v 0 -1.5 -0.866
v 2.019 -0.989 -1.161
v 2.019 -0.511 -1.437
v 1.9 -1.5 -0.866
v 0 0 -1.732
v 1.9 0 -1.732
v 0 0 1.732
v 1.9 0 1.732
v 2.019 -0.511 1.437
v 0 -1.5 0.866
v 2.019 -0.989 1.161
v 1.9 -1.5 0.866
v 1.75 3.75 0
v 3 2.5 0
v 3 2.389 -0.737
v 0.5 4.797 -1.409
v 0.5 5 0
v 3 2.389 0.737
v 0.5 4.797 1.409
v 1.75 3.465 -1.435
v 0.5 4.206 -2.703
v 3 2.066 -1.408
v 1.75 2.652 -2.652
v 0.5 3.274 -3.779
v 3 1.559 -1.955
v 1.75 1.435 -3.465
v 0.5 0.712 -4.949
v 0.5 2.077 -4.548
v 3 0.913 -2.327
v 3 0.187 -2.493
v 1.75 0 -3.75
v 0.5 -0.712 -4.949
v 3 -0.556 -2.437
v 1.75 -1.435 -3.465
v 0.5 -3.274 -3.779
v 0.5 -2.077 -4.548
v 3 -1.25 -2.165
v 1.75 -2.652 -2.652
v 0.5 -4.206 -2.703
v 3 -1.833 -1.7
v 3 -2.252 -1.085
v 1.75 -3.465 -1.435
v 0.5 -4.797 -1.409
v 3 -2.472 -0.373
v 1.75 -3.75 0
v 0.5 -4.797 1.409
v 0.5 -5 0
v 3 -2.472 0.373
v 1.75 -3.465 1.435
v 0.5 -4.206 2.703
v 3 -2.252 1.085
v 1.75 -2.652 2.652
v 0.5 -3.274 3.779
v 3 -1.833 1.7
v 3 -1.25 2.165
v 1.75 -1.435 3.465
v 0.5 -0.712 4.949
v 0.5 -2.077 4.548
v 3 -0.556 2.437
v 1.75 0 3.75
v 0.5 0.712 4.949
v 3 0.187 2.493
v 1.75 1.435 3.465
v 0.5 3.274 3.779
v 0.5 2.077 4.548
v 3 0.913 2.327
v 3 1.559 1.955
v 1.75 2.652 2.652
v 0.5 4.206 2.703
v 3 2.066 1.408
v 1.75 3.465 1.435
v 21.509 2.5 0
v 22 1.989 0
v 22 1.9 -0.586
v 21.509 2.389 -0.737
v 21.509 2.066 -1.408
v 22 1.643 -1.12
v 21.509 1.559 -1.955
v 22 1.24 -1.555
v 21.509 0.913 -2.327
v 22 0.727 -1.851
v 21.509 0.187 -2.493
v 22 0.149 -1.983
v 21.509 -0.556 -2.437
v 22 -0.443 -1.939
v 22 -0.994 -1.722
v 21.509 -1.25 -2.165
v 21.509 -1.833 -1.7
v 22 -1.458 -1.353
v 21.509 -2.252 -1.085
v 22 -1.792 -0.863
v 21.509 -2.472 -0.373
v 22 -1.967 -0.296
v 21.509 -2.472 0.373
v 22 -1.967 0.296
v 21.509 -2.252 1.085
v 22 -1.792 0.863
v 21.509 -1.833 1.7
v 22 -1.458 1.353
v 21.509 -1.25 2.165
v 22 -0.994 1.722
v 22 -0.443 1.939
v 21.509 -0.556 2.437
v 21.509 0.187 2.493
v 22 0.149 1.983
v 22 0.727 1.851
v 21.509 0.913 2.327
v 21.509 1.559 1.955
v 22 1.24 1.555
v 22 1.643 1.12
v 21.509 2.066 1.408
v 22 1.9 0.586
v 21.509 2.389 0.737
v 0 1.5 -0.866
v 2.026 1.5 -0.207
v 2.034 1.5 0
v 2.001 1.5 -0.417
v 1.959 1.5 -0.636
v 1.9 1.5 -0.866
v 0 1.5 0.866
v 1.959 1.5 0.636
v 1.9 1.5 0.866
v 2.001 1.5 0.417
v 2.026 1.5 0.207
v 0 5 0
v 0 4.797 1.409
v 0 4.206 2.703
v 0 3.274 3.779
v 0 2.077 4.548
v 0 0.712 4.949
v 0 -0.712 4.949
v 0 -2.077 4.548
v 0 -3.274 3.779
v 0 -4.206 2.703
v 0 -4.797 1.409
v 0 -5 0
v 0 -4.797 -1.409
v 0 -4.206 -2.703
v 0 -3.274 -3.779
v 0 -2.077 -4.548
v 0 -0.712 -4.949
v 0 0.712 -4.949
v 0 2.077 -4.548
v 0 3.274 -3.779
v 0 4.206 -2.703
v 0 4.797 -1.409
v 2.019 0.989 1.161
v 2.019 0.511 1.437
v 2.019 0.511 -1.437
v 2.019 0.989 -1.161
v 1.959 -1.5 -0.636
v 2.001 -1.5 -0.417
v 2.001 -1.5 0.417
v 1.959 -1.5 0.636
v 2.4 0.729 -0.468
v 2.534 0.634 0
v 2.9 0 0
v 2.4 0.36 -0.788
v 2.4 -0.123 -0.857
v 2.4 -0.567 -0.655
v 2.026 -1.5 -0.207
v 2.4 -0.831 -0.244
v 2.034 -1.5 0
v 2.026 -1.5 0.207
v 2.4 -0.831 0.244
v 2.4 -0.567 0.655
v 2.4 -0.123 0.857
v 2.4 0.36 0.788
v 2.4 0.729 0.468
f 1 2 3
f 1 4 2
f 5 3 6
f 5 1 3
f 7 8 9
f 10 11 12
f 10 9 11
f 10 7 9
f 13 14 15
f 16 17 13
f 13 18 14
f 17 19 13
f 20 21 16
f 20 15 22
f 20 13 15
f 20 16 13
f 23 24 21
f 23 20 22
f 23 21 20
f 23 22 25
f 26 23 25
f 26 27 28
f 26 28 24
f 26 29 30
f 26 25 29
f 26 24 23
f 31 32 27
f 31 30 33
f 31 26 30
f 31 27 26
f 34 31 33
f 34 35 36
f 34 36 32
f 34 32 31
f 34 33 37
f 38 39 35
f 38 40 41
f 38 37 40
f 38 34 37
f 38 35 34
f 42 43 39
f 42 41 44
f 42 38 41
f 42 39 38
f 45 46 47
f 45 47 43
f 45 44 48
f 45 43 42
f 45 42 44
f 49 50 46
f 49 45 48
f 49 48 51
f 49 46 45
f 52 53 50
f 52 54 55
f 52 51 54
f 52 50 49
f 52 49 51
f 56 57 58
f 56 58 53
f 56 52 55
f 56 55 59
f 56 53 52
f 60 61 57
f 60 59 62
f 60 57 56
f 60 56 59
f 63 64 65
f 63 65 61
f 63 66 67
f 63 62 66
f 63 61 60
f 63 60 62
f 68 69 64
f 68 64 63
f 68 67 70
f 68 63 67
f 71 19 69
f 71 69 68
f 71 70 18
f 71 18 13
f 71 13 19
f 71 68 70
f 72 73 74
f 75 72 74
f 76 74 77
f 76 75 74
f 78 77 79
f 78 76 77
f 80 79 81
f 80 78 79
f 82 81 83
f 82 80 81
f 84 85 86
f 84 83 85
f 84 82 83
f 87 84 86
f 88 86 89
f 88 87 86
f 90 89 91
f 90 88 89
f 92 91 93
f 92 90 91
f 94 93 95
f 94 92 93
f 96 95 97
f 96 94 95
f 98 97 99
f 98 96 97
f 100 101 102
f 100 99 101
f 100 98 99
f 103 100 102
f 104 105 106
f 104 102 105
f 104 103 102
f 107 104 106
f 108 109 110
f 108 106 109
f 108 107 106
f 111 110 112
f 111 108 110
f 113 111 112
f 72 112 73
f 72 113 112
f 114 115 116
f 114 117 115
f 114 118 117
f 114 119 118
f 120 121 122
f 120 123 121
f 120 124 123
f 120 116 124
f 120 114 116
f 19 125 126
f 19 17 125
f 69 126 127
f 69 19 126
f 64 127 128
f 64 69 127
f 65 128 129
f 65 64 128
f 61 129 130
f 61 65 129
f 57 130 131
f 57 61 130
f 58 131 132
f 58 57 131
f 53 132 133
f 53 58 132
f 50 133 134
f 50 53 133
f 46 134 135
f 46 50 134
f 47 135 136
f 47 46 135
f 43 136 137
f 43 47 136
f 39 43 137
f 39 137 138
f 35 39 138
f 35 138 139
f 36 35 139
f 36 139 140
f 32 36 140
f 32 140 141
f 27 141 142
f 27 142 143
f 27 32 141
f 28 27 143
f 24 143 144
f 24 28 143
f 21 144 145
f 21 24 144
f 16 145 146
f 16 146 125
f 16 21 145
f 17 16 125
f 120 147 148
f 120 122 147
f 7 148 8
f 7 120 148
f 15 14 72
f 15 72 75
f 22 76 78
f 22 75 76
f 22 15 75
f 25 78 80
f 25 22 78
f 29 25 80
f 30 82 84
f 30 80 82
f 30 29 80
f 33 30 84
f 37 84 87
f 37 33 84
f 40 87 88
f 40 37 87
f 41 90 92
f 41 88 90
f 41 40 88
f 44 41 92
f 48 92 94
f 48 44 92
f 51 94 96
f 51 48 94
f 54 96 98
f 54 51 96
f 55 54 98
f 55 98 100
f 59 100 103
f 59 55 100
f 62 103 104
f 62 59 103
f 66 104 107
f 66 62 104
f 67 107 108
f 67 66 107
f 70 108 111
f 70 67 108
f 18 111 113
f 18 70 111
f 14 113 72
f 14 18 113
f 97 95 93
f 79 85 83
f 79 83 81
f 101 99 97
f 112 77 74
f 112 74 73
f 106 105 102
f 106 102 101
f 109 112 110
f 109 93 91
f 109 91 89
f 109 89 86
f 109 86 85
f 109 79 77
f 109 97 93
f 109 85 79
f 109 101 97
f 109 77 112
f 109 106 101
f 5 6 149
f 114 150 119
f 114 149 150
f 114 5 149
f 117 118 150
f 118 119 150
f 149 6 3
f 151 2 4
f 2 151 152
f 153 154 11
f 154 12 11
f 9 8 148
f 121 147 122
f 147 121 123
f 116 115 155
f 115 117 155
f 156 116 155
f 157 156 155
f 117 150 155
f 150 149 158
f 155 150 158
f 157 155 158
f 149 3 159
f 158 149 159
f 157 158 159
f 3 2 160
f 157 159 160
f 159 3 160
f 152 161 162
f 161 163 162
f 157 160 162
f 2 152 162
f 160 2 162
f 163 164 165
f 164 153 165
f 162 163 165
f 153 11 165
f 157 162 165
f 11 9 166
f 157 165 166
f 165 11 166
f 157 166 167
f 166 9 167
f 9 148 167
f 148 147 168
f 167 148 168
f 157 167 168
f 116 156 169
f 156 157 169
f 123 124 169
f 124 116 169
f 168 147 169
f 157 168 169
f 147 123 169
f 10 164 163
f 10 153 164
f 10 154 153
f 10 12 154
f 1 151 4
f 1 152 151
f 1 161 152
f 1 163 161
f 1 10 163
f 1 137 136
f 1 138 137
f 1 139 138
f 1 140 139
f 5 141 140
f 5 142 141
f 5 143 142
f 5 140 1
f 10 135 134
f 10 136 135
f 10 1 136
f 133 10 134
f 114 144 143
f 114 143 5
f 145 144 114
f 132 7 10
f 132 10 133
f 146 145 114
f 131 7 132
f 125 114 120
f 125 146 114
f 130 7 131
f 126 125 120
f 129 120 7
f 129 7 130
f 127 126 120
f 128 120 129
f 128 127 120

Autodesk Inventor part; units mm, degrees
ref_plane "YZ Plane" through (0, 0, 0) normal (1, 0, 0) x (0, 1, 0)
ref_plane "XZ Plane" through (0, 0, 0) normal (0, 1, 0) x (-1, 0, 0)
sketch "Sketch1" plane through (0, 0, 0) normal (0, 0, 1) x (1, 0, 0)
  line L0 (22, 0) -> (22, 2.5)
  line L1 (22, 2.5) -> (12, 2.5)
  line L2 (12, 2.5) -> (11.5092, 2.5)
  line L3 (0, 5) -> (0, 1.7321)
  line L4 (0, 1.7321) -> (1.9, 1.7321)
  line L5 (1.9, 1.7321) -> (2.9, 0)
  line L6 (2.9, 0) -> (22, 0)
  line L7 (0, 5) -> (0.5, 5)
  line L8 (0.5, 5) -> (3, 2.5)
  line L9 (11.5092, 2.5) -> (3, 2.5)
  line L10 (12, 2.5) -> (3, 2.5) construction
  line L11 (3, 2.5) -> (3, 2.5)
  line L12 (-4.4, 0) -> (26.4, 0) projected
  line L13 (0, -1) -> (0, 6) projected
  dimension "d0" = 22
  dimension "d1" = 10
  dimension "d2" = 1.9
  dimension "d3" = 5
  dimension "d6" = 3
  dimension "d7" = 45
  dimension "d8" = 3.4641
  dimension "d9" = 60
  dimension "d10" = 10
  dimension "d11" = 5
  dimension "d12" = 0.4908
revolve "Body" add sketch "Sketch1" angle 360 about axis through (2.9, 0, 0) along (1, 0, 0) contours L6 L5 L4 L3 L7 L8 L9 L2 L1 L0
sketch "Sketch2" plane through (0, 0, 0) normal (-1, 0, 0) x (0, 0, 1)
  circle A0 centre (0, 0) radius 1.7321 projected
  line L0 (0, -7) -> (0, 7) projected
  line L1 (-7, 0) -> (7, 0) projected
  line L2 (1.7321, 0) -> (0.866, -1.5)
  line L3 (0.866, -1.5) -> (-0.866, -1.5)
  line L4 (-0.866, -1.5) -> (-1.7321, 0)
  line L5 (-1.7321, 0) -> (-0.866, 1.5)
  line L6 (-0.866, 1.5) -> (0.866, 1.5)
  line L7 (0.866, 1.5) -> (1.7321, 0)
  point P0 (0, 1.7321)
extrude "Slot" add sketch "Sketch2" against normal up to next contours L7 A0 | A0 L2 | L6 L0 A0 | A0 L0 L3 | L0 L6 A0 | A0 L3 L0 | L4 A0 | A0 L5
thread "Thread" size "M5x0.8" class "6g" standard "ISO Metric profile" length 22
chamfer "Chamfer1" distance 0.5112 distance2 0.4908 1 edges at (22, -2.5, 0) measured on face at (22, 0.4809, 1.1324)
ref_plane "Work Plane1" through (104.775, 0, 0) normal (0, 0, -1) x (1, 0, 0)
equation "\"d15\" = GEL"
equation "\"d17\" = -0.5 * SPD + 0.5 * GD"
equation "\"d18\" = GUL"
equation "\"d2\" = INTI"
equation "\"d3\" = GD"
equation "\"d7\" = 0.5 * SEWI"
equation "\"d8\" = 1.1547 * SW"
equation "\"d11\" = BDM"
equation "\"d12\" = GAL"
equation "\"INTI\" = 1.9"
equation "\"GEL\" = 22"
equation "\"GAL\" = 0.61345 * PTC"
equation "\"KOH\" = 3.1"
equation "\"KOD\" = 9.75"
equation "\"GUL\" = 0.61345 * PTC"
equation "\"SPD\" = 3.97758"
equation "\"BDM\" = NND"
equation "\"GD\" = NND"
equation "\"SEWI\" = 90deg"
equation "\"SW\" = 3"
equation "\"TOA\" = 30deg"
equation "\"GD1\" = THREADDIA - 1.2269 * PTC"
equation "\"EPV\" = 4.875"
equation "\"THREADDIA\" = 5"
equation "\"PTC\" = 0.8"
equation "\"NND\" = 5"
equation "\"E0\" = 1.155 * SW"
properties part number "ANSI/IFI 535 - M5x0.8 x 40, FHSFCHCSM" material "Steel, Mild"
